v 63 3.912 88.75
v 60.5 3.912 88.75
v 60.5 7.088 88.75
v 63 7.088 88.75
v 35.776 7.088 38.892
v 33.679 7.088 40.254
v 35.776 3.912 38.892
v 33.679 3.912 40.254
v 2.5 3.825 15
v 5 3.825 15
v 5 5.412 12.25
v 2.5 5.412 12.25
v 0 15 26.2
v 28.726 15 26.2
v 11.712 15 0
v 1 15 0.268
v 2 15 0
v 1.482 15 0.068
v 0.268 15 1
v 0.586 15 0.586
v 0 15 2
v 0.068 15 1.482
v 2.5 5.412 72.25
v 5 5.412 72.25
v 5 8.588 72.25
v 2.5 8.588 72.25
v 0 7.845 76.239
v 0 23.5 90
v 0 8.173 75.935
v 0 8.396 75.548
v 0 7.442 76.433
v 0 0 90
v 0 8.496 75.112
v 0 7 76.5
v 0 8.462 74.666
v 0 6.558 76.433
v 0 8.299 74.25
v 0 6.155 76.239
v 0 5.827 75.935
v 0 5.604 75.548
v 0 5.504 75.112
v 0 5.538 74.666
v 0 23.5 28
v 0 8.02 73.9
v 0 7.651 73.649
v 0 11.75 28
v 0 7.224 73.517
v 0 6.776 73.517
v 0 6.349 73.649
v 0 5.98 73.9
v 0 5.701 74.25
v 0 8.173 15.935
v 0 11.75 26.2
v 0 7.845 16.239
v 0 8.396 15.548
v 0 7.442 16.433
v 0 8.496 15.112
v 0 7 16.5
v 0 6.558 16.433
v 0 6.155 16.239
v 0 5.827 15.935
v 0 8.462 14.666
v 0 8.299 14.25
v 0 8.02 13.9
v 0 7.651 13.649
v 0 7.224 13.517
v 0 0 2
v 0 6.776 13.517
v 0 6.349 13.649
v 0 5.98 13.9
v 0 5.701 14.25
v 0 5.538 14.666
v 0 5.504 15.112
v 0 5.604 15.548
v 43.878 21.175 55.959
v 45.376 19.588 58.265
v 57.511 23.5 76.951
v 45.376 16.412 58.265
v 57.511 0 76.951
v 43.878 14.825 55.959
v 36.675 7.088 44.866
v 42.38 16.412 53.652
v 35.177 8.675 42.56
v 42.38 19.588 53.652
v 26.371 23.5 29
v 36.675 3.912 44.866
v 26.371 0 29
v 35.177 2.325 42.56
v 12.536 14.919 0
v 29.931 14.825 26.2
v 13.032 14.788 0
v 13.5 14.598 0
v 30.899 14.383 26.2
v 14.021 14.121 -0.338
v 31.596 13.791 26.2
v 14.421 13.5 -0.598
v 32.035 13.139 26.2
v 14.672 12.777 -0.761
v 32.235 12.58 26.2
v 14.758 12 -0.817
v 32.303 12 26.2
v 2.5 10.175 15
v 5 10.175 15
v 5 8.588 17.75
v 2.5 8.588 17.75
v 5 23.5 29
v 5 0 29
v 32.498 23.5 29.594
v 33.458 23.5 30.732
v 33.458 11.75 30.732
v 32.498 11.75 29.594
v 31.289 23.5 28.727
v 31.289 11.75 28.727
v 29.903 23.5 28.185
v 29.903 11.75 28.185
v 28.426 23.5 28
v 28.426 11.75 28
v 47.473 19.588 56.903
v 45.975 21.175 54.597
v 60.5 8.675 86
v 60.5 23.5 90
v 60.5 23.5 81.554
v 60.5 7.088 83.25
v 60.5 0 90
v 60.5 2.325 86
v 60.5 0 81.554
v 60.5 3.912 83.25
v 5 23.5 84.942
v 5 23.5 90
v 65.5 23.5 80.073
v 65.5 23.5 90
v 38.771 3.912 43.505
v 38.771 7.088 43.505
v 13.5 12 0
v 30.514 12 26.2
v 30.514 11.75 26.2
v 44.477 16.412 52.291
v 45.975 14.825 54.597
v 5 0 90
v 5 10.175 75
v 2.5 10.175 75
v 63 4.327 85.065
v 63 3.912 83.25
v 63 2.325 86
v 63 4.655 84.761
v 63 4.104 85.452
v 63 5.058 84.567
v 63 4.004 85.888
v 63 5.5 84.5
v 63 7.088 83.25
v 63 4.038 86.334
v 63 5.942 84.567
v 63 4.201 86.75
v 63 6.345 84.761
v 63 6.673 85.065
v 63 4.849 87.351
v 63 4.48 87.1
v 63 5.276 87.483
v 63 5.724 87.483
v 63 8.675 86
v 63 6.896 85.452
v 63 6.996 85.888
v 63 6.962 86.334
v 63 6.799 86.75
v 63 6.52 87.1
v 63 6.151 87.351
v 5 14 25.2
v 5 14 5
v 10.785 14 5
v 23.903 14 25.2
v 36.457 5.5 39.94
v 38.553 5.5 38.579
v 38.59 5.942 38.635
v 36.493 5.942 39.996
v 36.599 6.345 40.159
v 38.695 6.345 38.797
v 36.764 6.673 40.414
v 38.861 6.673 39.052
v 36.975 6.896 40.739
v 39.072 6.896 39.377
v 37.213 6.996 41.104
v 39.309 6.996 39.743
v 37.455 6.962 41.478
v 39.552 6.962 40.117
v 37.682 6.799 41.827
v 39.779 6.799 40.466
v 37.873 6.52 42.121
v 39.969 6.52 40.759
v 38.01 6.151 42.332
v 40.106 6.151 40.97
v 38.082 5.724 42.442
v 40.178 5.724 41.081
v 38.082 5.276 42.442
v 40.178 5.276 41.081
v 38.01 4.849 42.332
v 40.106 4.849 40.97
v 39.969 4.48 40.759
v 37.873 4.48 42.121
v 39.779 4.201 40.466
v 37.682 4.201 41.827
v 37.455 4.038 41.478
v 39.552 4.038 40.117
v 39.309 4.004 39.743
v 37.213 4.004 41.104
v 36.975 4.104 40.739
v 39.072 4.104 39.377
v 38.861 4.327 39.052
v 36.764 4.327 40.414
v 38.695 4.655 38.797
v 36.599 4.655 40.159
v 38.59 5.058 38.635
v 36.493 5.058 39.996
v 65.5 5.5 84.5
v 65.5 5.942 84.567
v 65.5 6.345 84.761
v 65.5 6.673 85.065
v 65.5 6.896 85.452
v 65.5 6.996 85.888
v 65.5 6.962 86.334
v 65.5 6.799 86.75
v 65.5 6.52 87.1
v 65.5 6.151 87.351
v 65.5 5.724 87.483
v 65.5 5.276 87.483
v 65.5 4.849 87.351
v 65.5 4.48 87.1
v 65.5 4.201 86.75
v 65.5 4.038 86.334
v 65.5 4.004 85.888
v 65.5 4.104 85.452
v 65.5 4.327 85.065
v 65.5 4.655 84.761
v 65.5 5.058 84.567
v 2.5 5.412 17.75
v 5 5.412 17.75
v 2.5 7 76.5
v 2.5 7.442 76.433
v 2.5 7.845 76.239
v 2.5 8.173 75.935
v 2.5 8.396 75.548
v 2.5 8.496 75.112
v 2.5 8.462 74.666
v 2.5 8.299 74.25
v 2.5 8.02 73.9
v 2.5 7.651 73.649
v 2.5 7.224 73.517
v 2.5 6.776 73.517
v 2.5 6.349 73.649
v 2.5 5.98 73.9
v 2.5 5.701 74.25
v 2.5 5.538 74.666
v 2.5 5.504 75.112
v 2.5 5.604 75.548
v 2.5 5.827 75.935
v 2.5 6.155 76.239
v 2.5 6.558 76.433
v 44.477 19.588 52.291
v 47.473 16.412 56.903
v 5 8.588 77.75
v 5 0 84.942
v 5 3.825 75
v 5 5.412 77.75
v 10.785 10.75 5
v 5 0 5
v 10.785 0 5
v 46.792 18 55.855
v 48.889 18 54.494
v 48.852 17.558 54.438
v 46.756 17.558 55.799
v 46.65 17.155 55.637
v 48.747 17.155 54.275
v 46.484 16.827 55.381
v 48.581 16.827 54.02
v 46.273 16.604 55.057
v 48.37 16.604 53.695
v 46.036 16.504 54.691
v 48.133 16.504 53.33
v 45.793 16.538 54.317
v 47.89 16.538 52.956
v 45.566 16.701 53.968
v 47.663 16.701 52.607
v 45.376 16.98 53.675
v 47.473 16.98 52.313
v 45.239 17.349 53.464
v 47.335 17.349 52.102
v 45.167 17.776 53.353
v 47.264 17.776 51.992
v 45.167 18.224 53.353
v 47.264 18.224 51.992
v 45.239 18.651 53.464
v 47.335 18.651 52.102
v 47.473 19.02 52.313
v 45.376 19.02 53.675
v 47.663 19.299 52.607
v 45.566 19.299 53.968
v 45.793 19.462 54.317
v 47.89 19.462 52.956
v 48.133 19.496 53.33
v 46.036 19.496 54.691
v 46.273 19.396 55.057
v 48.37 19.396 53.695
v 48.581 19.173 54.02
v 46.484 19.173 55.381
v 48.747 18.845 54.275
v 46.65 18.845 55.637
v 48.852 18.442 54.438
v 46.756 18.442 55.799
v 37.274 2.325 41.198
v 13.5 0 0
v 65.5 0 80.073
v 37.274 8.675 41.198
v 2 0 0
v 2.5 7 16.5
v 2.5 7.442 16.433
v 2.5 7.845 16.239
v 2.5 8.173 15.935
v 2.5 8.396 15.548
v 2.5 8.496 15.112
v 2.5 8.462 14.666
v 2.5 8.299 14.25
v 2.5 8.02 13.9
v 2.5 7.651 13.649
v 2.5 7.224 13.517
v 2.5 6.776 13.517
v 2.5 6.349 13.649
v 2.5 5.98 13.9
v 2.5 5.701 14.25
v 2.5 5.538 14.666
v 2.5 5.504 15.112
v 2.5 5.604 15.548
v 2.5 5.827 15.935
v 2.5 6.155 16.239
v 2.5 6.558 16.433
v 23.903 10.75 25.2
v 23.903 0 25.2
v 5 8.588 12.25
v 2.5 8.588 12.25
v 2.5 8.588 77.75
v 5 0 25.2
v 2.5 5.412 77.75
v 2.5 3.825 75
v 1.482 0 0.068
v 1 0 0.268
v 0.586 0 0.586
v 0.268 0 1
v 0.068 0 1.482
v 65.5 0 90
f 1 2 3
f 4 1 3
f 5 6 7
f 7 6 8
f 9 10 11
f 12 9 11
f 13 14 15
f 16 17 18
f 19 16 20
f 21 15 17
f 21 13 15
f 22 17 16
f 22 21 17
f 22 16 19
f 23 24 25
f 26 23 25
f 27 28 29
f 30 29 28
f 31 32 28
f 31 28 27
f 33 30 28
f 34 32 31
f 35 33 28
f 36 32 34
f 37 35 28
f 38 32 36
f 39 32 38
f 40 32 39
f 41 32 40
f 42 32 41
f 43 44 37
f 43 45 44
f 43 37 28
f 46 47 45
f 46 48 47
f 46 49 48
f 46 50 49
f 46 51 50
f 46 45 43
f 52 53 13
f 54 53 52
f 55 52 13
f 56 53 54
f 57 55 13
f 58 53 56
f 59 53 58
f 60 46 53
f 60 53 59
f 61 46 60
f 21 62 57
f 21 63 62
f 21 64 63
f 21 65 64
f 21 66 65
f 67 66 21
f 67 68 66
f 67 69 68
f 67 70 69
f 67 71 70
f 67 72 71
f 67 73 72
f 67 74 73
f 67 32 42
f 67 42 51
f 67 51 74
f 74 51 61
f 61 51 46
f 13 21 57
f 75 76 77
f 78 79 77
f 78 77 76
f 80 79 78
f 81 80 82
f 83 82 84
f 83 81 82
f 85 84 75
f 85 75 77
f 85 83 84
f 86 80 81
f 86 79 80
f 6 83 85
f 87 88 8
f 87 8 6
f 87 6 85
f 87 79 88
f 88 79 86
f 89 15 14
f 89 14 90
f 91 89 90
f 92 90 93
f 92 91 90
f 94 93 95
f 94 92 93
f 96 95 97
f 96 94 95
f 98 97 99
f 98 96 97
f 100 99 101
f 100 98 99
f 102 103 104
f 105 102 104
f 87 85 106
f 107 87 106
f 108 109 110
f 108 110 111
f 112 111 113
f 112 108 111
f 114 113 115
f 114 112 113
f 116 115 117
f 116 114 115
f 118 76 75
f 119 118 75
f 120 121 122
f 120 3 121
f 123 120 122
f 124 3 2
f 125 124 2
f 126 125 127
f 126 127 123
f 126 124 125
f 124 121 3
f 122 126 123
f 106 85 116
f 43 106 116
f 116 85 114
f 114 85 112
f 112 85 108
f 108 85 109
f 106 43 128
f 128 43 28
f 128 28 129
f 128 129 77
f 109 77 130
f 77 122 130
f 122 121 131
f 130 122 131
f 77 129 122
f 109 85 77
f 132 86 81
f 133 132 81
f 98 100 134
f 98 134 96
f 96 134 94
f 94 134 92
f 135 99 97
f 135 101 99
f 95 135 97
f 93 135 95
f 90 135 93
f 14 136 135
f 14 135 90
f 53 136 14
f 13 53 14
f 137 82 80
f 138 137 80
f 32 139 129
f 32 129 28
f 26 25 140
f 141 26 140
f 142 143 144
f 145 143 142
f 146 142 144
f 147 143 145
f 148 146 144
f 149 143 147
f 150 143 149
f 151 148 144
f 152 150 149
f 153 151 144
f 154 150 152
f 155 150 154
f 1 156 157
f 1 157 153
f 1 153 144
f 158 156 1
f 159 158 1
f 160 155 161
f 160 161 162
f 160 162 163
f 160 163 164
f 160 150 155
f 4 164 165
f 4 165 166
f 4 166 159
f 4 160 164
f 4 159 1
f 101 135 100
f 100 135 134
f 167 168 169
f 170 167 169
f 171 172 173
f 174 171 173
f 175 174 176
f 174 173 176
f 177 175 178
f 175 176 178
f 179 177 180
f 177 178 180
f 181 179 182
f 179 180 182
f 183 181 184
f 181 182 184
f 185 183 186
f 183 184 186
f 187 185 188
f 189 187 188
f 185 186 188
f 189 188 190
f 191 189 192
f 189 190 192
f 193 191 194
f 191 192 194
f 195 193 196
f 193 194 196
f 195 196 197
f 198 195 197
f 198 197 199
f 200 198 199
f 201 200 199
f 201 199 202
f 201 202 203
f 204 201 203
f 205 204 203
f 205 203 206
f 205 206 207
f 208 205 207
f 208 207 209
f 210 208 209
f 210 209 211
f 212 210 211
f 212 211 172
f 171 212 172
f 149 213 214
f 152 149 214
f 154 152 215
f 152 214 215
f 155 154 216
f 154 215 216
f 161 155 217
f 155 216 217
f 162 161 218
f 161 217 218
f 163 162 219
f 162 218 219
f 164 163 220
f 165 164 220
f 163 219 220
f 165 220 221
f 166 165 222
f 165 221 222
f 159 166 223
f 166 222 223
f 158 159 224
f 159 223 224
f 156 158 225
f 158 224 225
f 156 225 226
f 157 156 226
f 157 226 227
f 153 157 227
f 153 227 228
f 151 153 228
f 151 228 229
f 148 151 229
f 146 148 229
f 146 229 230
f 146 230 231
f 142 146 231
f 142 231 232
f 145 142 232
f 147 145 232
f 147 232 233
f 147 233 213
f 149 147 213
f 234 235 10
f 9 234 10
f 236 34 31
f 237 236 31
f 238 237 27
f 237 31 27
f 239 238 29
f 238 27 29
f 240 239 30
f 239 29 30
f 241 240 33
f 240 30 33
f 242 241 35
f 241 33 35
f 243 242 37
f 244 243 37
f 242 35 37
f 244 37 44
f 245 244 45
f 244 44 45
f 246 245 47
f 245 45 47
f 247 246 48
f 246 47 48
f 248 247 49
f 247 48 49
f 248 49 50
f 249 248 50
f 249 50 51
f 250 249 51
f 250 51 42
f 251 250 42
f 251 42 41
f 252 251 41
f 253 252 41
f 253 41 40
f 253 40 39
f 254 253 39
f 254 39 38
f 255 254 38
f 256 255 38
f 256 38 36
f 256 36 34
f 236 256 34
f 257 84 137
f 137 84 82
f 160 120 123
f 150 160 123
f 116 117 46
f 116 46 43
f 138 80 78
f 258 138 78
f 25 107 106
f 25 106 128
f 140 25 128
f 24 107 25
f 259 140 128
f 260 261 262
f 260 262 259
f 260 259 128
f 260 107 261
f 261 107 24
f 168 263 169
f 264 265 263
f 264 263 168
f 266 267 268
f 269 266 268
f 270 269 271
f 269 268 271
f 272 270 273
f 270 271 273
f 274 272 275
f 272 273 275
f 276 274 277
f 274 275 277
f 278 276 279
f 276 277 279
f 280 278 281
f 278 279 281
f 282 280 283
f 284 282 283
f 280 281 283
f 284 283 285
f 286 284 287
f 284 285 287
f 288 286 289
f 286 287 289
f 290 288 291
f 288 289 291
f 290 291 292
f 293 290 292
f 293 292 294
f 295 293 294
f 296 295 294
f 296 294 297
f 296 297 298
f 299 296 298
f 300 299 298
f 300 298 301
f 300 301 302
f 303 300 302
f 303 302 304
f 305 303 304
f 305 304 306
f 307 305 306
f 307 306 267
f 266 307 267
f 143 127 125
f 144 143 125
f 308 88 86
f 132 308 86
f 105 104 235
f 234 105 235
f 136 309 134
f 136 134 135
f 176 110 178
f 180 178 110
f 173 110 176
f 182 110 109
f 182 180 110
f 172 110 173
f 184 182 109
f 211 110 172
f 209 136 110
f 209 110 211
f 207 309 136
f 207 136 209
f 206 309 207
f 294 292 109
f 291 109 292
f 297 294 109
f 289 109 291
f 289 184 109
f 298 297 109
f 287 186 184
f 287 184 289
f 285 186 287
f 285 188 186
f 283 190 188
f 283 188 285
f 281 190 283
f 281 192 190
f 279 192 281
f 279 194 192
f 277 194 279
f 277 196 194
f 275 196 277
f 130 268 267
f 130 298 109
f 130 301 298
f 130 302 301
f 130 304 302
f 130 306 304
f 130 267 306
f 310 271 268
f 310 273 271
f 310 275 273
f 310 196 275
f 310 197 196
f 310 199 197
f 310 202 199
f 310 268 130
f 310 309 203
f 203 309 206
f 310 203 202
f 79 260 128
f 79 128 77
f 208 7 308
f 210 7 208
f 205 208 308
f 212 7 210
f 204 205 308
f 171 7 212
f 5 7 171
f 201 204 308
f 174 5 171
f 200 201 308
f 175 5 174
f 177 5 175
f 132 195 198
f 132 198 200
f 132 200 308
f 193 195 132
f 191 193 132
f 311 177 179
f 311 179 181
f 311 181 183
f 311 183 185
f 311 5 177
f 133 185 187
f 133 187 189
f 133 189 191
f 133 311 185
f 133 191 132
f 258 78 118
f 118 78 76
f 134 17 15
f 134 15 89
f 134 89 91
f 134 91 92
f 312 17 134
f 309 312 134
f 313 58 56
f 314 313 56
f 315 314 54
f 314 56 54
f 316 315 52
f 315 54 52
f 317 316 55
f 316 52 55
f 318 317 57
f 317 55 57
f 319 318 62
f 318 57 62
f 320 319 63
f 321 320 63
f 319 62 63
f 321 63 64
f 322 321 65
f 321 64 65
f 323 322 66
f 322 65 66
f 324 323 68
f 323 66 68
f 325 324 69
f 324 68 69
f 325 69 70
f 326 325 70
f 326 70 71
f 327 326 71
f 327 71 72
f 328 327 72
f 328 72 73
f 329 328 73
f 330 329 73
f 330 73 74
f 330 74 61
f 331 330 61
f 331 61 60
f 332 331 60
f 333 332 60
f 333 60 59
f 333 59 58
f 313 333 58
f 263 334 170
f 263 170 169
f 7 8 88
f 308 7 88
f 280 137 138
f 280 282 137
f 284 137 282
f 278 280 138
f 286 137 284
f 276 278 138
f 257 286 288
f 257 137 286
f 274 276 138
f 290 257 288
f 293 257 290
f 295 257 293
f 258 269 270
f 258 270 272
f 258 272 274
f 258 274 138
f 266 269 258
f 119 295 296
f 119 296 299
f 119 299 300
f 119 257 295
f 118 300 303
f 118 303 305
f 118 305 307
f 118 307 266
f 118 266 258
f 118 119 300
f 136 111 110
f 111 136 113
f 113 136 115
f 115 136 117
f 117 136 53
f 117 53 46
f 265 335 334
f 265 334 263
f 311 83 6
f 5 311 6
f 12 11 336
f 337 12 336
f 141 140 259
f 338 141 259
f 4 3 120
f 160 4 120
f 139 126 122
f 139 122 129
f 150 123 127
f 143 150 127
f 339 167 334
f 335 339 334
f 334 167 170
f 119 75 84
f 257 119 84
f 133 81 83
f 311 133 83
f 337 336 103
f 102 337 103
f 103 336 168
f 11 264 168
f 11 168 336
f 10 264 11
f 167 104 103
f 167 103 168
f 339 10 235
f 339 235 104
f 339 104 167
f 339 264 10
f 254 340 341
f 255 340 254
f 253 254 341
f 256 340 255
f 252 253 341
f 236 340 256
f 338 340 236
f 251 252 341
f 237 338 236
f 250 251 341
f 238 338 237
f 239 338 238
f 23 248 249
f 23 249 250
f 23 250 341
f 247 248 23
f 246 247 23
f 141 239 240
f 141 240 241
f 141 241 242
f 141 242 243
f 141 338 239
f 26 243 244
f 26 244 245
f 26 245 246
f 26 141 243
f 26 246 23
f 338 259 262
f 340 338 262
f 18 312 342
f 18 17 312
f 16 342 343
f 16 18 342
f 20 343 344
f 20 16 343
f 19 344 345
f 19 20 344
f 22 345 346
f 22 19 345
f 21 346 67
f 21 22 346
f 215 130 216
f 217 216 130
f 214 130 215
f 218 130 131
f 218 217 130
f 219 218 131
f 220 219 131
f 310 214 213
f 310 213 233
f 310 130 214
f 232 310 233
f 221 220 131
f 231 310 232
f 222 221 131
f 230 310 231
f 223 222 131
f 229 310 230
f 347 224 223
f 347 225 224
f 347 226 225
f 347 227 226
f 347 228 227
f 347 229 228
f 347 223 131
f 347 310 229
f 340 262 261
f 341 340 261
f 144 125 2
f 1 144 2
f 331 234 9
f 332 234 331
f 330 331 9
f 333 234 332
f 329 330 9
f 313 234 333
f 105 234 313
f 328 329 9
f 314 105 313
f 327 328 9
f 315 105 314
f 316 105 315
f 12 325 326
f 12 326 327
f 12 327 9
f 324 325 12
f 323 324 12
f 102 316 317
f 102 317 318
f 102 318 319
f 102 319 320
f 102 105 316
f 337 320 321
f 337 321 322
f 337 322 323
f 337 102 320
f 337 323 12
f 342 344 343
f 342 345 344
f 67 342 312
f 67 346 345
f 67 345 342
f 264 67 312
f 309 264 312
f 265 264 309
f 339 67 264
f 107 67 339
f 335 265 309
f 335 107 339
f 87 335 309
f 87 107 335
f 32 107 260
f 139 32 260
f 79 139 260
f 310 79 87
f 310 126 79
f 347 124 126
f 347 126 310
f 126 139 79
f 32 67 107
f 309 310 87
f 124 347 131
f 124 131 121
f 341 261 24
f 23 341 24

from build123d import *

# Parameters (mm, degrees)
BOSS_EXTRU_1_DEPTH       = 23.5
ESQUISSE10_W             = 28
ESQUISSE10_H             = 8.5
ENL_V_MAT_EXTRU_9_DEPTH  = 114.765108887
ESQUISSE11_W             = 33.386172199
ESQUISSE11_H             = 3
BOSS_EXTRU_2_DEPTH       = 1.5
ESQUISSE12_W             = 1.8
ESQUISSE12_H             = 11.75
ENL_V_MAT_EXTRU_10_DEPTH = 114.765108887
COQUE2_DEPTH             = 23.5
COQUE2_2_DEPTH           = 10.75
COQUE2_START             = 10.75
COQUE2_3_DEPTH           = 3.25
CONG_2_R                 = 2
CONG_3_R                 = 3
ESQUISSE5_R              = 1.5
ENL_V_MAT_EXTRU_4_DEPTH  = 8
ESQUISSE7_R              = 1.5
ENL_V_MAT_EXTRU_6_DEPTH  = 8
ESQUISSE9_R              = 1.5
ENL_V_MAT_EXTRU_8_DEPTH  = 7.5
BOSS_EXTRU_3_DEPTH       = 23.5
BOSS_EXTRU_4_DEPTH       = 10.75
ENL_V_MAT_EXTRU_11_DEPTH = 2.5
ENL_V_MAT_EXTRU_12_DEPTH = 2.5
ENL_V_MAT_EXTRU_13_DEPTH = 2.5
CONG_5_R                 = 6


# Read off the part's stored shape, not the designer's step: Coque2
with BuildPart() as part:
    # Esquisse1 → Boss.-Extru.1 (new body)
    with BuildSketch(Plane(origin=(0, 0, 0), x_dir=(1, 0, 0), z_dir=(0, 1, 0))):
        Polygon((0, 0), (13.5, 0), (65.5, -80.072978118), (65.5, -90), (0, -90), align=None)
    extrude(amount=BOSS_EXTRU_1_DEPTH)

    # Esquisse10 → Enlèv. mat.-Extru.9 (cut, through all)
    with BuildSketch(Plane(origin=(65.5, 0, 0), x_dir=(0, 0, -1), z_dir=(1, 0, 0))):
        with Locations((-14, 19.25)):
            Rectangle(ESQUISSE10_W, ESQUISSE10_H)
    extrude(amount=-ENL_V_MAT_EXTRU_9_DEPTH, mode=Mode.SUBTRACT)

    # Esquisse11 → Boss.-Extru.2 (add)
    with BuildSketch(Plane(origin=(9.495472341, 0, -6.166431839), x_dir=(-0.5446390350150256, 0, -0.838670567945425), z_dir=(0.8386705679454252, 0, -0.5446390350150256))):
        with Locations((-24.045713072, 13.5)):
            Rectangle(ESQUISSE11_W, ESQUISSE11_H)
    extrude(amount=BOSS_EXTRU_2_DEPTH)

    # Esquisse12 → Enlèv. mat.-Extru.10 (cut, through all)
    with BuildSketch(Plane.ZY):
        with Locations((27.1, 17.625)):
            Rectangle(ESQUISSE12_W, ESQUISSE12_H)
    extrude(amount=-ENL_V_MAT_EXTRU_10_DEPTH, mode=Mode.SUBTRACT)

    # Coque2 outline → Coque2 (cut)
    with BuildSketch(Plane(origin=(0, 0, 0), x_dir=(1, 0, 0), z_dir=(0, 1, 0))):
        Polygon((60.5, -81.554045593), (26.371003739, -29), (5, -29), (5, -90), (60.5, -90), align=None)
    extrude(amount=COQUE2_DEPTH, mode=Mode.SUBTRACT)

    # Coque2 2 outline → Coque2 2 (cut)
    with BuildSketch(Plane(origin=(0, 0, 0), x_dir=(1, 0, 0), z_dir=(0, 1, 0))):
        Polygon((10.785221502, -5), (5, -5), (5, -29), (26.371003739, -29), align=None)
    extrude(amount=COQUE2_2_DEPTH, mode=Mode.SUBTRACT)

    # Coque2 3 outline → Coque2 3 (cut)
    with BuildSketch(Plane(origin=(0, 0, 0), x_dir=(1, 0, 0), z_dir=(0, 1, 0)).offset(COQUE2_START)):
        Polygon((23.903254884, -25.2), (10.785221502, -5), (5, -5), (5, -25.2), align=None)
    extrude(amount=COQUE2_3_DEPTH, mode=Mode.SUBTRACT)

    # Congé2
    cong_2_edges = [part.edges().sort_by_distance(p)[0] for p in [
        (0, 7.5, 0),
    ]]
    fillet(cong_2_edges, radius=CONG_2_R)

    # Congé3
    cong_3_edges = [part.edges().sort_by_distance(p)[0] for p in [
        (23.530514866, 15, 12.691520724),
    ]]
    fillet(cong_3_edges, radius=CONG_3_R - 0.0001)  # a hair under: the kernel refuses the full size

    # Esquisse5 → Enlèv. mat.-Extru.4 (cut)
    with BuildSketch(Plane.ZY):
        with Locations((15, 7)):
            Circle(ESQUISSE5_R)
        with Locations((75, 7)):
            Circle(ESQUISSE5_R)
    extrude(amount=-ENL_V_MAT_EXTRU_4_DEPTH, mode=Mode.SUBTRACT)

    # Esquisse7 → Enlèv. mat.-Extru.6 (cut)
    with BuildSketch(Plane(origin=(9.495472341, 0, -6.166431839), x_dir=(-0.5446390350150254, 0, -0.8386705679454252), z_dir=(0.8386705679454252, 0, -0.5446390350150254))):
        with Locations((-54.852626973, 5.5)):
            Circle(ESQUISSE7_R)
        with Locations(Location((-70.828706829, 18, 0), (0, 0, 180))):
            Circle(ESQUISSE7_R)
    extrude(amount=-ENL_V_MAT_EXTRU_6_DEPTH, mode=Mode.SUBTRACT)

    # Esquisse9 → Enlèv. mat.-Extru.8 (cut)
    with BuildSketch(Plane(origin=(65.5, 0, 0), x_dir=(0, 0, -1), z_dir=(1, 0, 0))):
        with Locations((-86, 5.5)):
            Circle(ESQUISSE9_R)
    extrude(amount=-ENL_V_MAT_EXTRU_8_DEPTH, mode=Mode.SUBTRACT)

    # Esquisse13 → Boss.-Extru.3 (add)
    with BuildSketch(Plane.XZ):
        Polygon((60.5, 81.554045593), (5, 90), (5, 84.94243498), (57.510973677, 76.951348682), align=None)
    extrude(amount=-BOSS_EXTRU_3_DEPTH)

    # Esquisse14 → Boss.-Extru.4 (add)
    with BuildSketch(Plane.XZ.offset(-10.75)):
        Polygon((5, 25.2), (23.903254884, 25.2), (26.371003739, 29), (5, 29), align=None)
    extrude(amount=BOSS_EXTRU_4_DEPTH)

    # Esquisse16 → Enlèv. mat.-Extru.11 (cut)
    with BuildSketch(Plane(origin=(5, 0, 0), x_dir=(0, 0, -1), z_dir=(1, 0, 0))):
        Polygon((-72.25, 8.58771324), (-75, 10.175426481), (-77.75, 8.58771324), (-77.75, 5.41228676), (-75, 3.824573519), (-72.25, 5.41228676), align=None)
        Polygon((-12.25, 8.58771324), (-15, 10.175426481), (-17.75, 8.58771324), (-17.75, 5.41228676), (-15, 3.824573519), (-12.25, 5.41228676), align=None)
    extrude(amount=-ENL_V_MAT_EXTRU_11_DEPTH, mode=Mode.SUBTRACT)

    # Esquisse17 → Enlèv. mat.-Extru.12 (cut)
    with BuildSketch(Plane.ZY.offset(-60.5)):
        Polygon((86, 2.324573519), (88.75, 3.91228676), (88.75, 7.08771324), (86, 8.675426481), (83.25, 7.08771324), (83.25, 3.91228676), align=None)
    extrude(amount=-ENL_V_MAT_EXTRU_12_DEPTH, mode=Mode.SUBTRACT)

    # Esquisse18 → Enlèv. mat.-Extru.13 (cut)
    with BuildSketch(Plane(origin=(5.302119501, 0, -3.443236664), x_dir=(0.5446390350150256, 0, 0.838670567945425), z_dir=(-0.8386705679454252, 0, 0.5446390350150256))):
        Polygon((57.602626973, 7.08771324), (54.852626973, 8.675426481), (52.102626973, 7.08771324), (52.102626973, 3.91228676), (54.852626973, 2.324573519), (57.602626973, 3.91228676), align=None)
        Polygon((73.578706829, 19.58771324), (70.828706829, 21.175426481), (68.078706829, 19.58771324), (68.078706829, 16.41228676), (70.828706829, 14.824573519), (73.578706829, 16.41228676), align=None)
    extrude(amount=-ENL_V_MAT_EXTRU_13_DEPTH, mode=Mode.SUBTRACT)

    # Congé5
    cong_5_edges = [part.edges().sort_by_distance(p)[0] for p in [
        (31.68341261, 17.625, 28),
    ]]
    fillet(cong_5_edges, radius=CONG_5_R)


solid = part.part
